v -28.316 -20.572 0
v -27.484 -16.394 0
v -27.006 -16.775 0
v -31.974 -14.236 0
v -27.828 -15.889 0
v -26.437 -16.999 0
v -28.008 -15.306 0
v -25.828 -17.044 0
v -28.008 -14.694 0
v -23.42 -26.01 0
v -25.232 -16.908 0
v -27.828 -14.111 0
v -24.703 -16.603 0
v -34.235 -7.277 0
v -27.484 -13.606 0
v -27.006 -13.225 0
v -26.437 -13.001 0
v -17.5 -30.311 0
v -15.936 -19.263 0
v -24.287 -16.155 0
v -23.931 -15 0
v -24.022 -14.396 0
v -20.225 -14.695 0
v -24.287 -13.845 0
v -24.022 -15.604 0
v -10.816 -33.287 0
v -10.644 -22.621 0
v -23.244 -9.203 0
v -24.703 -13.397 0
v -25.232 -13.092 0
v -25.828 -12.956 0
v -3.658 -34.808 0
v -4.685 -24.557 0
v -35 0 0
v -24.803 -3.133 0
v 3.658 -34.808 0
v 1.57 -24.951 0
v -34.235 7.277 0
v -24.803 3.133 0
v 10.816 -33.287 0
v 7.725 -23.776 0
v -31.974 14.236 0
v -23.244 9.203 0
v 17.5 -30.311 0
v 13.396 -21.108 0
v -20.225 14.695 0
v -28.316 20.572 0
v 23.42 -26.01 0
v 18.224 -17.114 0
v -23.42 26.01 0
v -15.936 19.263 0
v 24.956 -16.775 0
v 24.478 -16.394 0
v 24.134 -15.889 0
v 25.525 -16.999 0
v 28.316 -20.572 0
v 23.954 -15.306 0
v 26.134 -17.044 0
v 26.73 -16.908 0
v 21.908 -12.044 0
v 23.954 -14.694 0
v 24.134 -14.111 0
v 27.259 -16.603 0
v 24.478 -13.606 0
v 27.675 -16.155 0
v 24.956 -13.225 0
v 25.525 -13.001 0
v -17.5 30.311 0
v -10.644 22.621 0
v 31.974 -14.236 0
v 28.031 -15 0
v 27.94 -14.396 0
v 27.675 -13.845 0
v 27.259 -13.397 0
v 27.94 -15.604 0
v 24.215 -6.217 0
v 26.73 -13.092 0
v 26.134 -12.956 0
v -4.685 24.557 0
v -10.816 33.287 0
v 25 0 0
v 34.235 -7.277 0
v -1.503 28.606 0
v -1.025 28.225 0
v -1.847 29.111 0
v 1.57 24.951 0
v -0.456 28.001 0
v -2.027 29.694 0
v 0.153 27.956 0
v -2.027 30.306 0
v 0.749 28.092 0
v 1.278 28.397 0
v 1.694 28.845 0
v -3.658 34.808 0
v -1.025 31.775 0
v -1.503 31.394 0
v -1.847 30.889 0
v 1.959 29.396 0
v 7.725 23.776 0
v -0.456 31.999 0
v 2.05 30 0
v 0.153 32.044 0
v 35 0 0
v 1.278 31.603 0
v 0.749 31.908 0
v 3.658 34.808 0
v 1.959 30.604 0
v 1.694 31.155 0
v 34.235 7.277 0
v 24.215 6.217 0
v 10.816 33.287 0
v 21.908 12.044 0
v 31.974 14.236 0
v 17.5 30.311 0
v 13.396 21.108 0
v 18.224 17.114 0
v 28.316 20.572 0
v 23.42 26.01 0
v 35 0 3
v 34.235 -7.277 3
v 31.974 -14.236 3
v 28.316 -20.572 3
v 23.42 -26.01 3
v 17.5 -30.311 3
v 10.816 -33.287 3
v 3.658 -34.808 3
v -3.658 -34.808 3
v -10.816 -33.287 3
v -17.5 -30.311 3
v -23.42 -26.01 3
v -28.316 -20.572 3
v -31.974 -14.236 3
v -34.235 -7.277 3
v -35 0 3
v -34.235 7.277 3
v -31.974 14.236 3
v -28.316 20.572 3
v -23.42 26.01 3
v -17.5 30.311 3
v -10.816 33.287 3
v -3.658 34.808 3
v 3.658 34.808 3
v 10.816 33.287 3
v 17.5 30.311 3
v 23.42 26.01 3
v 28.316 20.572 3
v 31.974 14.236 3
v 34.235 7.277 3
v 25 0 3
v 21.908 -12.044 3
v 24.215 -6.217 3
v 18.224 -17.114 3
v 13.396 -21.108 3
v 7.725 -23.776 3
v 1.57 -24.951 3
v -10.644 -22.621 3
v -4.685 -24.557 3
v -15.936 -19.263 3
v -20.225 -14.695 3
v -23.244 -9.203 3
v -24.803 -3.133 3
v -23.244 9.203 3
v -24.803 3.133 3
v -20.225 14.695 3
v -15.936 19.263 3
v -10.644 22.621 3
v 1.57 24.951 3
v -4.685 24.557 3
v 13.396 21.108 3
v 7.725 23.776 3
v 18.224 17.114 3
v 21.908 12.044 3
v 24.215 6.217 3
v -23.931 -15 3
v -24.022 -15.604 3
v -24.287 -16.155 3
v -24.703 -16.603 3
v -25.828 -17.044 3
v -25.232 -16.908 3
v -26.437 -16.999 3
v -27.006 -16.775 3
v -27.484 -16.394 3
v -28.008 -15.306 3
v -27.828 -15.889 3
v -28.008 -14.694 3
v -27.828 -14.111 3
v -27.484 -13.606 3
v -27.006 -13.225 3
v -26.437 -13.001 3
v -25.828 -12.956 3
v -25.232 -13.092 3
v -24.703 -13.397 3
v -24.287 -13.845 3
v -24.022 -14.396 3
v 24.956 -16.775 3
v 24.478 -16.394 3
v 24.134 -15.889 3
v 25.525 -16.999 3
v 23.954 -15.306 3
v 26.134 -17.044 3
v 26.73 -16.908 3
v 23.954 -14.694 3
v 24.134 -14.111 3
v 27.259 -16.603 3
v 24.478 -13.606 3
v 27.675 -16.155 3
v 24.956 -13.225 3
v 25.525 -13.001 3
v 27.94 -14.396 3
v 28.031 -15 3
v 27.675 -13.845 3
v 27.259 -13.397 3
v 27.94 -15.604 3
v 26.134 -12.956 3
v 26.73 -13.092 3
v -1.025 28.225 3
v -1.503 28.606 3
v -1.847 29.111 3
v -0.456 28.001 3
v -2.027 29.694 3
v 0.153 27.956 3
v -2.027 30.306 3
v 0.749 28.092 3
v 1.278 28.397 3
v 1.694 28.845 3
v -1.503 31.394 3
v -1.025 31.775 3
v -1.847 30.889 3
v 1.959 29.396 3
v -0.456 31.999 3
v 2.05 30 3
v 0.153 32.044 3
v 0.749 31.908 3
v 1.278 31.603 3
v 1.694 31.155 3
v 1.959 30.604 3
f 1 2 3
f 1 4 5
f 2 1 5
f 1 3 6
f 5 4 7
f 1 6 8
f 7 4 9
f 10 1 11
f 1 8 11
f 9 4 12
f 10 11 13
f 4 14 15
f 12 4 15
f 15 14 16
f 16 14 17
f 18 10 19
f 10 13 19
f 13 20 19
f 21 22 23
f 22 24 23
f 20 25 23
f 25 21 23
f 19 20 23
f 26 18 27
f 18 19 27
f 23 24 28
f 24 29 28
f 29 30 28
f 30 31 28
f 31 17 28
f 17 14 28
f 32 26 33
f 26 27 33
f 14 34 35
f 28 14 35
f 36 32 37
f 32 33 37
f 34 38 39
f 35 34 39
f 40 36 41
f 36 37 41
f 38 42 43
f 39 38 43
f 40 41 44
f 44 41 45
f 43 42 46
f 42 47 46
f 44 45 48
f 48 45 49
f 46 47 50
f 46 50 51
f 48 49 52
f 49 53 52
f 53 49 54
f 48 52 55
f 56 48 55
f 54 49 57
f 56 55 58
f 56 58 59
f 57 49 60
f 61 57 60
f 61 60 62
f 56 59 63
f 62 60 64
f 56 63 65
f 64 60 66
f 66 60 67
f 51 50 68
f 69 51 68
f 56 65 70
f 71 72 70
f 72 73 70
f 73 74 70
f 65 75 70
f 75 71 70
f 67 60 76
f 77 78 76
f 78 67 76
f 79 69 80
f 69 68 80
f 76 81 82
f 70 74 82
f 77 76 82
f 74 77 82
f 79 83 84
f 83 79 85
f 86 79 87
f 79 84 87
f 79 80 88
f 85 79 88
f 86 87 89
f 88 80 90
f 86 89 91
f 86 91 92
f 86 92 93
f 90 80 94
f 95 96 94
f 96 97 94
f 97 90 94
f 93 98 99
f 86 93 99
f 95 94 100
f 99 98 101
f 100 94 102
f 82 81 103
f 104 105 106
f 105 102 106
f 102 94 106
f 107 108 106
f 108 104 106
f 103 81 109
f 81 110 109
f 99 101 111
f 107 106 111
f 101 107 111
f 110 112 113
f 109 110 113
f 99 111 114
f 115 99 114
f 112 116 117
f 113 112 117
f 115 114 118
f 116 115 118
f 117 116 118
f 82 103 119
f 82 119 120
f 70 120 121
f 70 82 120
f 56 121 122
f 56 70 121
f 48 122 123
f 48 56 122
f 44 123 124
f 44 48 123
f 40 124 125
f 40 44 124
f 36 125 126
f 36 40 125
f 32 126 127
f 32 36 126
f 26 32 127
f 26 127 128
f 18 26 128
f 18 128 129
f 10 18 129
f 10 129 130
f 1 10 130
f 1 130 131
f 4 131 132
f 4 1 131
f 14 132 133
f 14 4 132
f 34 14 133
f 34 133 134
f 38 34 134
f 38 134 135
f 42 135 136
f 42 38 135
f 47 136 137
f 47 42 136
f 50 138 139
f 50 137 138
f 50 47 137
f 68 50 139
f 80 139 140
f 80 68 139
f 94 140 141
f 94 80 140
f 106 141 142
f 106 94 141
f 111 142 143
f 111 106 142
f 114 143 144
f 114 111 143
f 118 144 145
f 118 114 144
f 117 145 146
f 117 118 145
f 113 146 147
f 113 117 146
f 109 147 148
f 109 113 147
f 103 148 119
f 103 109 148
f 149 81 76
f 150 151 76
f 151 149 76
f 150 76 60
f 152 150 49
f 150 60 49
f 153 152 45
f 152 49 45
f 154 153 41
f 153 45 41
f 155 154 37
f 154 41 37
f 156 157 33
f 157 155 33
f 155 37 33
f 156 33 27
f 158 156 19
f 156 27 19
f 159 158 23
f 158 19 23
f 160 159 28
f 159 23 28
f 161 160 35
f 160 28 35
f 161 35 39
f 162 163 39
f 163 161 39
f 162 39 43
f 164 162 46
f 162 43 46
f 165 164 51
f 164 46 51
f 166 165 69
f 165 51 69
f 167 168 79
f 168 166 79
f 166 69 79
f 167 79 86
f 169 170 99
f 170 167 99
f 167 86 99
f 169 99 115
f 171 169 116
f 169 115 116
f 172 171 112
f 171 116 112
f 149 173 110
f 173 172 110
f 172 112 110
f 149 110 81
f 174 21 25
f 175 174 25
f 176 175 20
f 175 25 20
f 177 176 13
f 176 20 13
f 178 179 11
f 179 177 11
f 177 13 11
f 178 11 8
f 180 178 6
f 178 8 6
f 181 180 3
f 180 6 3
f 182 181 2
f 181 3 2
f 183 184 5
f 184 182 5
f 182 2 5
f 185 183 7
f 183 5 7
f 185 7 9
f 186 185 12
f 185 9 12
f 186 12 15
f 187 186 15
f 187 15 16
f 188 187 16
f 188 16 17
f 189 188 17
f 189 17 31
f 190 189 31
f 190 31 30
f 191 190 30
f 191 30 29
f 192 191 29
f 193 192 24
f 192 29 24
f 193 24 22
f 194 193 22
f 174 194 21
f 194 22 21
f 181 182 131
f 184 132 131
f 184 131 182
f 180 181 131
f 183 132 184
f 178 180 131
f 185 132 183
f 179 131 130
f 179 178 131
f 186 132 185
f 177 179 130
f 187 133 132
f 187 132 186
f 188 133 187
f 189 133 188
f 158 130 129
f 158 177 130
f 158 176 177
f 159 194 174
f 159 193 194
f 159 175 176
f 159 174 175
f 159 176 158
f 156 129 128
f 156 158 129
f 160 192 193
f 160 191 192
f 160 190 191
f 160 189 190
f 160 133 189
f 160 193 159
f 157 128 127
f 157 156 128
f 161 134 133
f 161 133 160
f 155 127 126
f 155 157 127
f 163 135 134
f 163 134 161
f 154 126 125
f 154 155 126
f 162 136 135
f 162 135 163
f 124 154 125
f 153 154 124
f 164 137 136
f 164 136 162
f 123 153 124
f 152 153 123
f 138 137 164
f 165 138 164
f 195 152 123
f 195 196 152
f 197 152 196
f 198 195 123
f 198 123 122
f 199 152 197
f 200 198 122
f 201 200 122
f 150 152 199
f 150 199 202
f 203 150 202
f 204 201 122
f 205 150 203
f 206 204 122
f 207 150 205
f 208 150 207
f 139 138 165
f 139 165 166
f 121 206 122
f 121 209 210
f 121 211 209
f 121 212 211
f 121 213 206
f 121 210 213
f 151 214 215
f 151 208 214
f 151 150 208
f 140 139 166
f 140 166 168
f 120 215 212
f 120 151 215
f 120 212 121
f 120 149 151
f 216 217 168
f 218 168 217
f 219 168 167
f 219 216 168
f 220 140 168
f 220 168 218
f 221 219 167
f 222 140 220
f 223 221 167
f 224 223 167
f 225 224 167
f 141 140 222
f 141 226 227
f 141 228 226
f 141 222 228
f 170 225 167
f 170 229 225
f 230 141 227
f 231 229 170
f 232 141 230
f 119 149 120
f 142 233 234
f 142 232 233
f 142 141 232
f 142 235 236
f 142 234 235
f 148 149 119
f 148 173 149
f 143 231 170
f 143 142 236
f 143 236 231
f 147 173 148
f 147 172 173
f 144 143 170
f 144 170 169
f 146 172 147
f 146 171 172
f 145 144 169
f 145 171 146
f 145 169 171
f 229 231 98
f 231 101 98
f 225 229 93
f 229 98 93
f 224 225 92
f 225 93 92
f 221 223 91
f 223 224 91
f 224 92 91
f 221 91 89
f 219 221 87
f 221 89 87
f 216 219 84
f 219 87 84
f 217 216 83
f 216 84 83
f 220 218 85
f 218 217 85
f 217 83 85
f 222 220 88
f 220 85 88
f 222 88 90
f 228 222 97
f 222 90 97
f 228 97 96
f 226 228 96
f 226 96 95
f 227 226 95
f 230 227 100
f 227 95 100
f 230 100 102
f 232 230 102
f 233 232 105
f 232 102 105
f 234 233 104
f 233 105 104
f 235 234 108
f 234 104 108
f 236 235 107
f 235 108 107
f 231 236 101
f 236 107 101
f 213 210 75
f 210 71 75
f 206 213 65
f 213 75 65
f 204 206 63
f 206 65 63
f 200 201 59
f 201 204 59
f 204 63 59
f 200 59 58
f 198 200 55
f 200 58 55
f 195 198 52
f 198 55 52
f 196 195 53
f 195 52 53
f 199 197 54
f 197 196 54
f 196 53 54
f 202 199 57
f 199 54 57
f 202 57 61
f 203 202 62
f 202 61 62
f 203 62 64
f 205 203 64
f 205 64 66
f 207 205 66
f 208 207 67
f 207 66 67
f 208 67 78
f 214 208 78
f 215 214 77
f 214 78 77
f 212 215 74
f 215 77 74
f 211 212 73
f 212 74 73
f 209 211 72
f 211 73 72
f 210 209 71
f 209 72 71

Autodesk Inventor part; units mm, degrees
ref_plane "YZ Plane" through (0, 0, 0) normal (1, 0, 0) x (0, 1, 0)
ref_plane "XZ Plane" through (0, 0, 0) normal (0, 1, 0) x (-1, 0, 0)
ref_plane "XY Plane" through (0, 0, 0) normal (0, 0, 1) x (1, 0, 0)
sketch "Sketch1" plane through (0, 0, 0) normal (0, 0, 1) x (1, 0, 0)
  circle A0 centre (0, 0) radius 25
  circle A1 centre (0, 0) radius 35
  circle A2 centre (0, 30) radius 2.05
  circle A3 centre (-25.981, -15) radius 2.05
  circle A4 centre (25.981, -15) radius 2.05
  dimension "d0" = 50
  dimension "d1" = 70
  dimension "d2" = 4.1
  dimension "d3" = 30
  dimension "d4" = 4.1
  dimension "d5" = 4.1
  dimension "d6" = 15
  dimension "d7" = 25.981
  dimension "d8" = 25.981
extrude "Extrusion1" add sketch "Sketch1" along normal blind 3
equation "\"d8\" = d7"
properties part number "Griff_Ring"
